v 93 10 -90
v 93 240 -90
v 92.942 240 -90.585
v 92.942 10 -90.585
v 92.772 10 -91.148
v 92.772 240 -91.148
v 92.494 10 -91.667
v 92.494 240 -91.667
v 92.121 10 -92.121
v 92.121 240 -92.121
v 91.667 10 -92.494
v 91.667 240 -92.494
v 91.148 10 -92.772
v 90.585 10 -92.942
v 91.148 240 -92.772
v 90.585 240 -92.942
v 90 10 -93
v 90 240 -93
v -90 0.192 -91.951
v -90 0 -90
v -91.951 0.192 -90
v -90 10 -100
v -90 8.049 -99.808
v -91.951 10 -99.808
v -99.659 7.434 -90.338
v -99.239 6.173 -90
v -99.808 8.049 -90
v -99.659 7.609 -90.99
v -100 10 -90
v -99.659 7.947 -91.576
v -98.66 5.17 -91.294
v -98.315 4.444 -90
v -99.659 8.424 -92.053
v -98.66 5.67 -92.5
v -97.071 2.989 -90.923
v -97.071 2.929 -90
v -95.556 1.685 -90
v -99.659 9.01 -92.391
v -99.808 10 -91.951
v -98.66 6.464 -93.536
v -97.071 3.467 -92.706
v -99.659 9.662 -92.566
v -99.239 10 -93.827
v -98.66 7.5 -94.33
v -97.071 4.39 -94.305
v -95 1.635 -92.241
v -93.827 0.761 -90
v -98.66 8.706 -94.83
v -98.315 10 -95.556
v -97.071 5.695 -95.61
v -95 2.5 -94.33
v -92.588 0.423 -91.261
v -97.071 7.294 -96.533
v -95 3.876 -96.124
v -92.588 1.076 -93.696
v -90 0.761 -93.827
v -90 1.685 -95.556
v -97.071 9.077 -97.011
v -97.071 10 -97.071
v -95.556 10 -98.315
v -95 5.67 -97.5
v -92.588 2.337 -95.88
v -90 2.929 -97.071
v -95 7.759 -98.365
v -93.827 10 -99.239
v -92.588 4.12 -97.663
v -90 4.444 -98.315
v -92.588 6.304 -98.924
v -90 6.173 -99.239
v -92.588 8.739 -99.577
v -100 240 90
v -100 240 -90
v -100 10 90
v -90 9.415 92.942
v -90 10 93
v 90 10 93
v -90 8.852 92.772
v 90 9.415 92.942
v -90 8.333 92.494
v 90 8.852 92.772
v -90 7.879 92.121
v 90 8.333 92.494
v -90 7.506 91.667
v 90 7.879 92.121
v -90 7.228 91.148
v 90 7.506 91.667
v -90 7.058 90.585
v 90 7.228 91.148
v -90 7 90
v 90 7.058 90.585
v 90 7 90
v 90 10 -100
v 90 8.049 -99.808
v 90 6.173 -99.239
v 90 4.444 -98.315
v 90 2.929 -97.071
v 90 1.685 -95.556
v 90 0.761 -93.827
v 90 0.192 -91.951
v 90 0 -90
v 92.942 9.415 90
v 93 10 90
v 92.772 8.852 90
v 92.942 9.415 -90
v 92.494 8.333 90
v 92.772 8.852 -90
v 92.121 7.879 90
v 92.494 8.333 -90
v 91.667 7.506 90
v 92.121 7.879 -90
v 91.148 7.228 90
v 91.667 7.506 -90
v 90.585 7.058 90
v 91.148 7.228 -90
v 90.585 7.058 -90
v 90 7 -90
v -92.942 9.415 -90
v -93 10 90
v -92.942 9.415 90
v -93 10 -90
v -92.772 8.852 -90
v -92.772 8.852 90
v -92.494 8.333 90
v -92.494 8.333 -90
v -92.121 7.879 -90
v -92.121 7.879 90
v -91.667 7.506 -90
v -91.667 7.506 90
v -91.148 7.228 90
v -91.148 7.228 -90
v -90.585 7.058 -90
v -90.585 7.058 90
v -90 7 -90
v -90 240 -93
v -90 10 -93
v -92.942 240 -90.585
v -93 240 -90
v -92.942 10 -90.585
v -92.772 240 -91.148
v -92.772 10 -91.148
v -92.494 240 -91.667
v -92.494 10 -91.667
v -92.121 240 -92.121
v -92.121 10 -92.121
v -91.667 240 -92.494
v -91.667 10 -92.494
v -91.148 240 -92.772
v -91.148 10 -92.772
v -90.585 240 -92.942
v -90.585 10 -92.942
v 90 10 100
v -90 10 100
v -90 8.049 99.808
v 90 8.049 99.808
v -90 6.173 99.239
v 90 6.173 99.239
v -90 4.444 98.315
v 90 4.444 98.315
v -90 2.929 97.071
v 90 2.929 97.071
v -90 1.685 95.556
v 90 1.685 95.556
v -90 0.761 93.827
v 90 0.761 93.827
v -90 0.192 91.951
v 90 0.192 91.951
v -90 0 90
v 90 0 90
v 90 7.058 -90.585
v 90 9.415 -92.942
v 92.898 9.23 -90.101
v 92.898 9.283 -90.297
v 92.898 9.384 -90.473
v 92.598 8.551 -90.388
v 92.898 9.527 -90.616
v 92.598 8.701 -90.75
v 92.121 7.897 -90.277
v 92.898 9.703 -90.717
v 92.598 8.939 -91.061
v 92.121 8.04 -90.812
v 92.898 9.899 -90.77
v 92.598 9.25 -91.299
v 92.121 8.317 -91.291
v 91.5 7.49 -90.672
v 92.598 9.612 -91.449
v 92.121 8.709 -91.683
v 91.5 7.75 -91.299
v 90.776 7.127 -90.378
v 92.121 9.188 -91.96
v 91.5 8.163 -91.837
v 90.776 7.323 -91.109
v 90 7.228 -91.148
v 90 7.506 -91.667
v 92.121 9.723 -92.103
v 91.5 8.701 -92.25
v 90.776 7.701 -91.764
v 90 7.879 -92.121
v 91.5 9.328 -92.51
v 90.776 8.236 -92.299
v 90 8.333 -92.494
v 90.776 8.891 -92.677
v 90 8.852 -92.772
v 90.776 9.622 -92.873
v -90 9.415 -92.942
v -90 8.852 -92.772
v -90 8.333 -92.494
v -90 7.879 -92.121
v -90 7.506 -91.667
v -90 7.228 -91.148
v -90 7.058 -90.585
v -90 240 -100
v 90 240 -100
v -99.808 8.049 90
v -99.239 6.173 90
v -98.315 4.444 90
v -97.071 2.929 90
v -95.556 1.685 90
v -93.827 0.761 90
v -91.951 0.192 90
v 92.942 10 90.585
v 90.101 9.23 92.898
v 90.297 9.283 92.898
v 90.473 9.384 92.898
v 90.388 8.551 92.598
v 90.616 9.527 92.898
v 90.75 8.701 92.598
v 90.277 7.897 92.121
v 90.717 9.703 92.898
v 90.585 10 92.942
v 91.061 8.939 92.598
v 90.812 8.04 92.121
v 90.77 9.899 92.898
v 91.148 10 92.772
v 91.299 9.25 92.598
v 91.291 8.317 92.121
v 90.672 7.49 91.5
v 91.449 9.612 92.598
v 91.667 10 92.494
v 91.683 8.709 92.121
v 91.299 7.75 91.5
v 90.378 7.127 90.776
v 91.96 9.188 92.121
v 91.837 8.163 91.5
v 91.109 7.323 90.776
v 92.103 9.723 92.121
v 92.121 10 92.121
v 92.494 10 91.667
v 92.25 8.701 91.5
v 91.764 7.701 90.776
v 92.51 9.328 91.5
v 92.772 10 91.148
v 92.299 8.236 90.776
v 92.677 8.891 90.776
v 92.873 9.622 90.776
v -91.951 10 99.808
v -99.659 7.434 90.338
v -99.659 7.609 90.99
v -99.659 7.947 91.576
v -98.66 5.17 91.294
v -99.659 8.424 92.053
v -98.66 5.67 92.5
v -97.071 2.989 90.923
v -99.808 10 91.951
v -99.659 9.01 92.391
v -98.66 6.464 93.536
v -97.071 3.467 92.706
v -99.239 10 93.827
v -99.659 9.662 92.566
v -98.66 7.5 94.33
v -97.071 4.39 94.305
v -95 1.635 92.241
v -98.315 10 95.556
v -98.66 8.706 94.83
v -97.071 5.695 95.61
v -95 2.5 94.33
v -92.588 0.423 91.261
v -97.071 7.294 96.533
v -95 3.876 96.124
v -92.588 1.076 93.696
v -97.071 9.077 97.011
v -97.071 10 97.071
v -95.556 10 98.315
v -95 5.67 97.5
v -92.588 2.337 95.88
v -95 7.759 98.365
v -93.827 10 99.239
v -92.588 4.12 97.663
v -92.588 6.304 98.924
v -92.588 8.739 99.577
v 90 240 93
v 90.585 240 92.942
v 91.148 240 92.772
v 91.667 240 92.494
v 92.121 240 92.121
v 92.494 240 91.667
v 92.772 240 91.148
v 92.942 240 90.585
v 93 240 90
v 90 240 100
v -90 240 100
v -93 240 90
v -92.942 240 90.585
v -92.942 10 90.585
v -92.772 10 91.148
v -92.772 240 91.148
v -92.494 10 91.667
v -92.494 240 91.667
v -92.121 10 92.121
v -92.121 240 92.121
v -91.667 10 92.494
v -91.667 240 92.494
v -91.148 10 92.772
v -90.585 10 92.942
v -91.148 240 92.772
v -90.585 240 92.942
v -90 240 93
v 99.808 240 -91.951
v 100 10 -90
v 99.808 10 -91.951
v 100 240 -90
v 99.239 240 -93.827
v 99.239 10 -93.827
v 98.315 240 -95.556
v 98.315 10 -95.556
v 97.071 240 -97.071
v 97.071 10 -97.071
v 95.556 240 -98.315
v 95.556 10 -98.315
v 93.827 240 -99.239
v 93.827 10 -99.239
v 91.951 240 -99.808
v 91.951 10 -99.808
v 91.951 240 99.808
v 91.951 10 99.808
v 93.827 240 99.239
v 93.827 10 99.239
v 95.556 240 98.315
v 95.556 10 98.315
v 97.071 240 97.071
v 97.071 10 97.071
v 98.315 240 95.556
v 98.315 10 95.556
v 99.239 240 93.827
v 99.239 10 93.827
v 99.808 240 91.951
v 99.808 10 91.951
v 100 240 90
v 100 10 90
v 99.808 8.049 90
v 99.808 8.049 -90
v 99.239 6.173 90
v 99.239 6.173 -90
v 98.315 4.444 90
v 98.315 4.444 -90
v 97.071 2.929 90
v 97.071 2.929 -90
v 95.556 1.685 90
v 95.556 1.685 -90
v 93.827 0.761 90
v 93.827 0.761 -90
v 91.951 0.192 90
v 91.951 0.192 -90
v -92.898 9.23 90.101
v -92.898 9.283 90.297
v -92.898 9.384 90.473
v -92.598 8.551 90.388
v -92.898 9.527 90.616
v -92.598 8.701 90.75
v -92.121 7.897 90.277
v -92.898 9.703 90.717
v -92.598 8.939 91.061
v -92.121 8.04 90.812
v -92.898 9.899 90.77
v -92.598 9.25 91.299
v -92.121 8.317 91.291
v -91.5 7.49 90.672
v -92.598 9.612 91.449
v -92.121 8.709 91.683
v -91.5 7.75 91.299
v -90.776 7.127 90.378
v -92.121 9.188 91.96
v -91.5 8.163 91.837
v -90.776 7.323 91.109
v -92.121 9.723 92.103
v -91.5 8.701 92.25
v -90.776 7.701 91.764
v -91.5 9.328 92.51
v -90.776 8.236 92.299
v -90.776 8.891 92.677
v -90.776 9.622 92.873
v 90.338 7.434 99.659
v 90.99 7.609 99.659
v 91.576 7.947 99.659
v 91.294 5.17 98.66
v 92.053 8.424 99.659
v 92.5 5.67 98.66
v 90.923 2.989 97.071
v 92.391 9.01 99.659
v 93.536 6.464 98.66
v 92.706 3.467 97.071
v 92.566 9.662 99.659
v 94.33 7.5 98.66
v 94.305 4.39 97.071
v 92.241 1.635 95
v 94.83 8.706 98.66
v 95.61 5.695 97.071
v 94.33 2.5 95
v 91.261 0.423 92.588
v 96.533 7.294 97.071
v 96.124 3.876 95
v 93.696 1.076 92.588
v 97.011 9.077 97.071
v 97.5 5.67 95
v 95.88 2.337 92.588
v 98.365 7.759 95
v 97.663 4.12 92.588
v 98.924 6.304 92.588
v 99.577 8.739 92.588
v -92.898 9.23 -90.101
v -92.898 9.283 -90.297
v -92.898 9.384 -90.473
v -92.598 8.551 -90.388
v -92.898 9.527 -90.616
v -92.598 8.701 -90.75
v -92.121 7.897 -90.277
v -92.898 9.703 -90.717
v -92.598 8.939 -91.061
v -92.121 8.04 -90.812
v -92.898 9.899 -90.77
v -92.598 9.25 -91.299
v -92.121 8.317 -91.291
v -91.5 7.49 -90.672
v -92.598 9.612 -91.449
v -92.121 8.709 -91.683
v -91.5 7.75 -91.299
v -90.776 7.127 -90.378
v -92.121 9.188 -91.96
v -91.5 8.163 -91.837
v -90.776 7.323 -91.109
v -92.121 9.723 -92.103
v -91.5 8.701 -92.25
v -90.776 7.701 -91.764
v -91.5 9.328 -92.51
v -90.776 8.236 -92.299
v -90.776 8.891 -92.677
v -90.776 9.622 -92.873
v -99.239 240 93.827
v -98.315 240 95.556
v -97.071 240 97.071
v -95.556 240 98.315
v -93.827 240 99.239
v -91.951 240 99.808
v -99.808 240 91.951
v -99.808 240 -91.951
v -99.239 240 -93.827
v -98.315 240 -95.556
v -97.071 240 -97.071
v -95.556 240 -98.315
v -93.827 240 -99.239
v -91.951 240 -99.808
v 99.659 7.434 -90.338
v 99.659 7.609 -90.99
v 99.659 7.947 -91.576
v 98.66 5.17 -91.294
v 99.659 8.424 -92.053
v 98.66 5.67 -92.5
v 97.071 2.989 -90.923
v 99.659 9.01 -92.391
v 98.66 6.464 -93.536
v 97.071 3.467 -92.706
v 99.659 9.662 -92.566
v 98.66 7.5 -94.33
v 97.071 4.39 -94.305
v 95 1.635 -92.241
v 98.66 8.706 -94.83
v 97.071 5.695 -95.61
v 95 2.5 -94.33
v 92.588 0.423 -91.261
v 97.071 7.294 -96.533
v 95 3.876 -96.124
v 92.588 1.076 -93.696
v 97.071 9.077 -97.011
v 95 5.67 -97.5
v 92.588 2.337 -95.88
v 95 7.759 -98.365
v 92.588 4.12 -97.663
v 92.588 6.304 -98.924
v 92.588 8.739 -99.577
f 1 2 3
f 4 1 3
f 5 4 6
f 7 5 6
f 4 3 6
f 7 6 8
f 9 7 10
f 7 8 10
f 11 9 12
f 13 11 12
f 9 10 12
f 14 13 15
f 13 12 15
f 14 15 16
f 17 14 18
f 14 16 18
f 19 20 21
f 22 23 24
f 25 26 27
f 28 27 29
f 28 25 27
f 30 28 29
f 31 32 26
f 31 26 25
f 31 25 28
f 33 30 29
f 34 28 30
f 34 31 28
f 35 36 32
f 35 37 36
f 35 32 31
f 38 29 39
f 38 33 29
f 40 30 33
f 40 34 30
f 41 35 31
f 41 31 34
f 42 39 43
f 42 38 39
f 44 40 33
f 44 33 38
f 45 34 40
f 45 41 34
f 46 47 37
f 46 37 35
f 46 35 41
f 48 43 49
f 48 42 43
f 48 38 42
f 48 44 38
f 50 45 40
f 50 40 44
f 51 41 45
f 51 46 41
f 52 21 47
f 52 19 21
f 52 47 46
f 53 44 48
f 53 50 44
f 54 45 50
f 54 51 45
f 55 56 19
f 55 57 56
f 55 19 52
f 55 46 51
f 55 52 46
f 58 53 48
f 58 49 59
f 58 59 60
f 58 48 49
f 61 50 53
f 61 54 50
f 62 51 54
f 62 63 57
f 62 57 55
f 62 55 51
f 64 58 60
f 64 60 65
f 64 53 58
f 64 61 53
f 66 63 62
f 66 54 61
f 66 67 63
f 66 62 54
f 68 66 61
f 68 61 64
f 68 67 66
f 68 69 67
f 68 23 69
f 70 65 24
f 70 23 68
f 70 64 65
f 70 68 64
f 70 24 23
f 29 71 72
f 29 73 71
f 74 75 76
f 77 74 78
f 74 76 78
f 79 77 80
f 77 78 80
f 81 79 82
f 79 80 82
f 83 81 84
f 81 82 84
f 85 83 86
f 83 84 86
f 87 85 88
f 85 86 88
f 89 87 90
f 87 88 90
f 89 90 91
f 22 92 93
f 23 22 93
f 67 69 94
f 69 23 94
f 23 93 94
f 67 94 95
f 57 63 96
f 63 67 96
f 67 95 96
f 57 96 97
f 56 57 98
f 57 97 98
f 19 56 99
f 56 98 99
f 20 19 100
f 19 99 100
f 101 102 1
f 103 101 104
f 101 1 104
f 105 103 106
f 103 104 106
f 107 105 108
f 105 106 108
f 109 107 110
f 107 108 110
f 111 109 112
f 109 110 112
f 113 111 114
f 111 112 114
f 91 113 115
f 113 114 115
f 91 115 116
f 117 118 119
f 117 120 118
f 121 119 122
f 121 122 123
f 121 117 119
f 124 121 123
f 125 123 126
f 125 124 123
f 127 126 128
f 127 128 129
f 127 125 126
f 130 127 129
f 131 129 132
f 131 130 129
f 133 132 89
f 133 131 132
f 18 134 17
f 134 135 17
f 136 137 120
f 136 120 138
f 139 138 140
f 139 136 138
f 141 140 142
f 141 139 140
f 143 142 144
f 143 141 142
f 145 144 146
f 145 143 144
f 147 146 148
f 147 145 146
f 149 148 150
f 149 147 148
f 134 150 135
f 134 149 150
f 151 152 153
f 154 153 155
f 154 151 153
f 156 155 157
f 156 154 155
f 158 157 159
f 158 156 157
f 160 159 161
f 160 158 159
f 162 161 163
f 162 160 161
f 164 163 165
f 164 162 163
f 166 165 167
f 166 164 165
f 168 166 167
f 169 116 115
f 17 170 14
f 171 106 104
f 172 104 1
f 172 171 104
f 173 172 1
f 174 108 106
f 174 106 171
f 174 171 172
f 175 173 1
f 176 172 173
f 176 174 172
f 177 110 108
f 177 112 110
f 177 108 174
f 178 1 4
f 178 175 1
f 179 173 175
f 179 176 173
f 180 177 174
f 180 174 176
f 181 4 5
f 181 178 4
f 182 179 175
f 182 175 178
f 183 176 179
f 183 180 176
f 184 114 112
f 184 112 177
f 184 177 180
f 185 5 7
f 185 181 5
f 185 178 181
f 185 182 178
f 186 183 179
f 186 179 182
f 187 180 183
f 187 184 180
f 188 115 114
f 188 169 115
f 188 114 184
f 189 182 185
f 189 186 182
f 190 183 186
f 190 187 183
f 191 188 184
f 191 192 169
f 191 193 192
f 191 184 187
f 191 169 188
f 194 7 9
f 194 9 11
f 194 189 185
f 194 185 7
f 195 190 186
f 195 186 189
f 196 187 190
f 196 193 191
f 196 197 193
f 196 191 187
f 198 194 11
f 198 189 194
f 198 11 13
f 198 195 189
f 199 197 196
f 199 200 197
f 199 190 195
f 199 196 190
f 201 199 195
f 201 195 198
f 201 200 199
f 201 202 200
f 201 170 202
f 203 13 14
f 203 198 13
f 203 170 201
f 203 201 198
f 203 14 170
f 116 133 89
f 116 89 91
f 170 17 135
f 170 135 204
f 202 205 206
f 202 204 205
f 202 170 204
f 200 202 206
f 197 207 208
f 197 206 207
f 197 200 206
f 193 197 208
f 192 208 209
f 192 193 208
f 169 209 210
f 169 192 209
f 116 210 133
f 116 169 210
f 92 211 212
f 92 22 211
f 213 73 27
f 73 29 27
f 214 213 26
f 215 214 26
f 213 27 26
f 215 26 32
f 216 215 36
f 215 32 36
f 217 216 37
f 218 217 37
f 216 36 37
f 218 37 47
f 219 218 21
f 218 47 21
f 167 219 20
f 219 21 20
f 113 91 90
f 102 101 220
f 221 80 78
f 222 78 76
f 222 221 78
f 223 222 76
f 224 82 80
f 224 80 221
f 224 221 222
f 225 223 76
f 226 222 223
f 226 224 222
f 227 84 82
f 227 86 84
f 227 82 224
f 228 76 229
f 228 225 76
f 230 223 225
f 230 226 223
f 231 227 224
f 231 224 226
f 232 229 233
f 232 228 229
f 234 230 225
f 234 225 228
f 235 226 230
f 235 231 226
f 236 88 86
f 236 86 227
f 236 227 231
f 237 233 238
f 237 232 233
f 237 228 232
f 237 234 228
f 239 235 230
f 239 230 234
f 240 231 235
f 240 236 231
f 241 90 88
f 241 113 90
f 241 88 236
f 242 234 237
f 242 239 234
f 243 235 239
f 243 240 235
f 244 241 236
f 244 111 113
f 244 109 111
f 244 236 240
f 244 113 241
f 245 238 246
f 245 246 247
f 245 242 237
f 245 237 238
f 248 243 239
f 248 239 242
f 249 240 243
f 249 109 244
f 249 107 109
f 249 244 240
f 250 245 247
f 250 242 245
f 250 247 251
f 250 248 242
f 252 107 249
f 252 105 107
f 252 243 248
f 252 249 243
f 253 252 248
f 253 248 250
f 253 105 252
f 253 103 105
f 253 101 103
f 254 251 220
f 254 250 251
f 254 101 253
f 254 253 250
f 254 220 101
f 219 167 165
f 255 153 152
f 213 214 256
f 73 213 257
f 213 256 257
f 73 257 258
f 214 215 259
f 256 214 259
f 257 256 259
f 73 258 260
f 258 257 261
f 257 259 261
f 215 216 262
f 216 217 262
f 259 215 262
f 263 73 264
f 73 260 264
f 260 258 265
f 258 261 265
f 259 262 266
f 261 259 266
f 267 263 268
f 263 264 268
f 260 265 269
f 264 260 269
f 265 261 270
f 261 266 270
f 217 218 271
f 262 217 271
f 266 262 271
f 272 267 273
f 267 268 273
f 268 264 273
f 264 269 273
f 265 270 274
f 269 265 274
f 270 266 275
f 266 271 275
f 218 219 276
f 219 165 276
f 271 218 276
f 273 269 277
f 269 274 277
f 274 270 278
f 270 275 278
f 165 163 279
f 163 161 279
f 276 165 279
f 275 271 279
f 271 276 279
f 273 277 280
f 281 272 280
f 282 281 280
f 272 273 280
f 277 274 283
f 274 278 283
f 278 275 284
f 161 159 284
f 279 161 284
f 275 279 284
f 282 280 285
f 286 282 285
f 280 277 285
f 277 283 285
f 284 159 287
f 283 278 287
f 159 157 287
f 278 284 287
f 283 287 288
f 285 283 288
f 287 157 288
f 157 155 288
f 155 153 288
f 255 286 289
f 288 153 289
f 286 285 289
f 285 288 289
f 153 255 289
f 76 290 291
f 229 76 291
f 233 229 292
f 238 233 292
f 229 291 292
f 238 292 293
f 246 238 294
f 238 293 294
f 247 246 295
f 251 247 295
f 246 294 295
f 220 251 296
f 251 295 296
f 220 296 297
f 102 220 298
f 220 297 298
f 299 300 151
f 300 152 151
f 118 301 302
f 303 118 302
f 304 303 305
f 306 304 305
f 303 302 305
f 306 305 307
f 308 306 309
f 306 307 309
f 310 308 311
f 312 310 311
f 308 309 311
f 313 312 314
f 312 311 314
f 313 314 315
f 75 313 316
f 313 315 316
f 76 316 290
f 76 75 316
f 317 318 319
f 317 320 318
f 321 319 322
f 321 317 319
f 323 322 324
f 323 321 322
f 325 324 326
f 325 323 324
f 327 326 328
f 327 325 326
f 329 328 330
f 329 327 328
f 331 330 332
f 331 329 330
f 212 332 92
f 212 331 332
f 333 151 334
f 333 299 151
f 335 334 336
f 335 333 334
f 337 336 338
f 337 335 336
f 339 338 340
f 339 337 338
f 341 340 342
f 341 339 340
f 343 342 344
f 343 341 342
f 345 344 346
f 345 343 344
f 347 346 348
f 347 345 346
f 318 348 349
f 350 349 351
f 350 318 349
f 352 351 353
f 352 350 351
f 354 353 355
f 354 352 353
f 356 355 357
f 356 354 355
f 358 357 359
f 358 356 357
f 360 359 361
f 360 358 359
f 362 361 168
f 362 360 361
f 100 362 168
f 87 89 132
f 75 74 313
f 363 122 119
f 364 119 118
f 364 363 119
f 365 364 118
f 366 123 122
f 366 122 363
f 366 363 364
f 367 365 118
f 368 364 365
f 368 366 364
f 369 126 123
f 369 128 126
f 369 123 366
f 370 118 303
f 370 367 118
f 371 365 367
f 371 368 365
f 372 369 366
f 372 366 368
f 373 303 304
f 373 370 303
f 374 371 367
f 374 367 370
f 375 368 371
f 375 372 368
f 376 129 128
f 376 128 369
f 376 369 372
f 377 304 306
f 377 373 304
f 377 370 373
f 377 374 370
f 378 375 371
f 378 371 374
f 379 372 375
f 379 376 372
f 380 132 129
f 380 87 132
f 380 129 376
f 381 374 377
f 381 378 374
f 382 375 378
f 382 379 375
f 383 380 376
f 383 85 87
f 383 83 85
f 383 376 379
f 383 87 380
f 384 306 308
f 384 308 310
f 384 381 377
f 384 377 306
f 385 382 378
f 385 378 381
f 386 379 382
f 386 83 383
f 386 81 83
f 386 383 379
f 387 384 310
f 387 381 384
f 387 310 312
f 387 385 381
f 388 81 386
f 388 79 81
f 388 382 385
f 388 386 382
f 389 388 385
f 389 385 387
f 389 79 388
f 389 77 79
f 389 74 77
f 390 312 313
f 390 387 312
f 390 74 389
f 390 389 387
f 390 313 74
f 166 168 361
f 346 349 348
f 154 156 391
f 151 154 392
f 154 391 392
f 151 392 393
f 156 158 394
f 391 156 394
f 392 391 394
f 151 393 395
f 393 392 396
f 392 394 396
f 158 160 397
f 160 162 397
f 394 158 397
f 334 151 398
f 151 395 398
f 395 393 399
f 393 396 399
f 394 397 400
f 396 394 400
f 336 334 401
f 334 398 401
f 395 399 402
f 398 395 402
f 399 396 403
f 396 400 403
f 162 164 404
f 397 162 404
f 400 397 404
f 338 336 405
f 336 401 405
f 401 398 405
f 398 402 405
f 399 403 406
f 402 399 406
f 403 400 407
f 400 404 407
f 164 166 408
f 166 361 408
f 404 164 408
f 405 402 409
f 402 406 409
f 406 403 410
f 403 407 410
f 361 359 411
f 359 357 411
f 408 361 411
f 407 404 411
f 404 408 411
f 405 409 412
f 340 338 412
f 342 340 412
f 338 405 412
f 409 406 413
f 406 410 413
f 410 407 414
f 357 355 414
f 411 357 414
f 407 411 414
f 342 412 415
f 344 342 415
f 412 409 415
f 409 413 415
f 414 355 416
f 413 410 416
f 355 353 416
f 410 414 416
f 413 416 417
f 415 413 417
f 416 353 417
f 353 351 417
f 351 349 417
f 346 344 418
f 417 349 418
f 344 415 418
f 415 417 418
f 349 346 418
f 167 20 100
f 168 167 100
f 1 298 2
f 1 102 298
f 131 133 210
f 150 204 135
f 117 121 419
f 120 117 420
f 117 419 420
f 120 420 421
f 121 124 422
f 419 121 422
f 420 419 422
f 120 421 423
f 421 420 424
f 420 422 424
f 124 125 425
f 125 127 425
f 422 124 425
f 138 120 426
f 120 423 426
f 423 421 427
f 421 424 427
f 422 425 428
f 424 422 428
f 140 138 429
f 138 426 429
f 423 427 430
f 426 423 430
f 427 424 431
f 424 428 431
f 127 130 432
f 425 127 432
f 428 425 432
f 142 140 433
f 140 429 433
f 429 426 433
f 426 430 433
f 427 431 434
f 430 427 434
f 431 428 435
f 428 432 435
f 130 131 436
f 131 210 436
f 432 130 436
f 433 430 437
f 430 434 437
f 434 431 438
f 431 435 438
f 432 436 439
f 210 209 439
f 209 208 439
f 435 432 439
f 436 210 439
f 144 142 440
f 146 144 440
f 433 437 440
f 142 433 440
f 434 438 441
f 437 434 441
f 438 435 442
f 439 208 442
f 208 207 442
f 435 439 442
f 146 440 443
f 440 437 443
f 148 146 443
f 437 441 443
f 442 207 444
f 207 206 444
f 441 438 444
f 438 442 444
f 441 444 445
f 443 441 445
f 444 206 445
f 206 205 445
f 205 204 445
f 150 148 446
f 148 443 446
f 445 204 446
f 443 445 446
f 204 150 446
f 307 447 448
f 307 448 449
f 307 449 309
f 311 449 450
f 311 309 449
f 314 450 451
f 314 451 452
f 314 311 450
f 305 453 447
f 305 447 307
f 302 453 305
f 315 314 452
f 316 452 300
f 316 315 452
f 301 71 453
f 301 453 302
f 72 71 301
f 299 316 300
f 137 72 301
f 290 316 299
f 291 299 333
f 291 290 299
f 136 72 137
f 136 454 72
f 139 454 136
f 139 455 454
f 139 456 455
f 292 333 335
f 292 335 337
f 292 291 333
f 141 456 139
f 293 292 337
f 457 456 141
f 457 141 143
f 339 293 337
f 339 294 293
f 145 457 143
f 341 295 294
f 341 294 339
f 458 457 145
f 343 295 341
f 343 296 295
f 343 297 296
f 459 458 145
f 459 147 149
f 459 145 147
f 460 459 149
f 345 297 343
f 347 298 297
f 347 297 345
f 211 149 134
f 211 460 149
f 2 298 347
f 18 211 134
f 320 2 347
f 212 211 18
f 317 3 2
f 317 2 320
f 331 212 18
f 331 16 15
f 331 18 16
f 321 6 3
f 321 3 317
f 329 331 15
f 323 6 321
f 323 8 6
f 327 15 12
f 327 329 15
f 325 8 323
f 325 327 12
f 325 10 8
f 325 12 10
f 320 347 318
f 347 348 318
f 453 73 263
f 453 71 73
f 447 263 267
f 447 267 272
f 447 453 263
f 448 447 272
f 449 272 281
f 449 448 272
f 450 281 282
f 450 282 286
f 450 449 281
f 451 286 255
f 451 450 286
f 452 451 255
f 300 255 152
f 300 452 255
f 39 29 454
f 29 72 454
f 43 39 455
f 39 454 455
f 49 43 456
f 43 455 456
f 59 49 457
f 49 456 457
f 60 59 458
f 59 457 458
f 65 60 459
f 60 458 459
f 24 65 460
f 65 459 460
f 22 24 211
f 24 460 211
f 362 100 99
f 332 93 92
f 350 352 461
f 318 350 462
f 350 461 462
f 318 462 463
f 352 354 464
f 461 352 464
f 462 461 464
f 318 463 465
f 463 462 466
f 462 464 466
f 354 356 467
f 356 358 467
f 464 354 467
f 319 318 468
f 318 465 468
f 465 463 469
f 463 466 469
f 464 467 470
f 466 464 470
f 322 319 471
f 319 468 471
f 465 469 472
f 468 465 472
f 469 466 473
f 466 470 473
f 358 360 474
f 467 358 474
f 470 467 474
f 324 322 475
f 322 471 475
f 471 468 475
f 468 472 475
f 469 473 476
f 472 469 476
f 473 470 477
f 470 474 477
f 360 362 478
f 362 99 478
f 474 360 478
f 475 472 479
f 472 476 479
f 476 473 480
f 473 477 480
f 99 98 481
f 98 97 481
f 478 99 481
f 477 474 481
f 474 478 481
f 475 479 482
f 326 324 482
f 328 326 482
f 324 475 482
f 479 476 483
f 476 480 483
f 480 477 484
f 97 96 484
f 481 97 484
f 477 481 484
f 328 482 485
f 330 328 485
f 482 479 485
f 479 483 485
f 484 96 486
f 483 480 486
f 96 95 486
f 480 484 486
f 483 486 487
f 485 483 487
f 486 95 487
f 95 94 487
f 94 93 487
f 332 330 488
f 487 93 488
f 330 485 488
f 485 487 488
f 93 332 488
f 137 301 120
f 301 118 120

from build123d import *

# Parameters (mm, degrees)
SKETCH1_W           = 200
SKETCH1_H           = 200
BOSS_EXTRUDE1_DEPTH = 240
FILLET1_R           = 10
SHELL1_T            = -7


with BuildPart() as part:
    # Sketch1 → Boss-Extrude1 (new body)
    with BuildSketch(Plane(origin=(0, 0, 0), x_dir=(1, 0, 0), z_dir=(0, 1, 0))):
        Rectangle(SKETCH1_W, SKETCH1_H)
    extrude(amount=BOSS_EXTRUDE1_DEPTH)

    # Fillet1
    fillet1_edges = [part.edges().sort_by_distance(p)[0] for p in [
        (0, 0, -100),
        (100, 0, 0),
        (0, 0, 100),
        (-100, 0, 0),
        (-100, 120, -100),
        (100, 120, -100),
        (100, 120, 100),
        (-100, 120, 100),
    ]]
    fillet(fillet1_edges, radius=FILLET1_R)

    # Shell1
    shell1_openings = [part.faces().sort_by_distance(p)[0] for p in [
        (0, 240, 0),
    ]]
    offset(amount=SHELL1_T, openings=shell1_openings, kind=Kind.INTERSECTION)


solid = part.part
